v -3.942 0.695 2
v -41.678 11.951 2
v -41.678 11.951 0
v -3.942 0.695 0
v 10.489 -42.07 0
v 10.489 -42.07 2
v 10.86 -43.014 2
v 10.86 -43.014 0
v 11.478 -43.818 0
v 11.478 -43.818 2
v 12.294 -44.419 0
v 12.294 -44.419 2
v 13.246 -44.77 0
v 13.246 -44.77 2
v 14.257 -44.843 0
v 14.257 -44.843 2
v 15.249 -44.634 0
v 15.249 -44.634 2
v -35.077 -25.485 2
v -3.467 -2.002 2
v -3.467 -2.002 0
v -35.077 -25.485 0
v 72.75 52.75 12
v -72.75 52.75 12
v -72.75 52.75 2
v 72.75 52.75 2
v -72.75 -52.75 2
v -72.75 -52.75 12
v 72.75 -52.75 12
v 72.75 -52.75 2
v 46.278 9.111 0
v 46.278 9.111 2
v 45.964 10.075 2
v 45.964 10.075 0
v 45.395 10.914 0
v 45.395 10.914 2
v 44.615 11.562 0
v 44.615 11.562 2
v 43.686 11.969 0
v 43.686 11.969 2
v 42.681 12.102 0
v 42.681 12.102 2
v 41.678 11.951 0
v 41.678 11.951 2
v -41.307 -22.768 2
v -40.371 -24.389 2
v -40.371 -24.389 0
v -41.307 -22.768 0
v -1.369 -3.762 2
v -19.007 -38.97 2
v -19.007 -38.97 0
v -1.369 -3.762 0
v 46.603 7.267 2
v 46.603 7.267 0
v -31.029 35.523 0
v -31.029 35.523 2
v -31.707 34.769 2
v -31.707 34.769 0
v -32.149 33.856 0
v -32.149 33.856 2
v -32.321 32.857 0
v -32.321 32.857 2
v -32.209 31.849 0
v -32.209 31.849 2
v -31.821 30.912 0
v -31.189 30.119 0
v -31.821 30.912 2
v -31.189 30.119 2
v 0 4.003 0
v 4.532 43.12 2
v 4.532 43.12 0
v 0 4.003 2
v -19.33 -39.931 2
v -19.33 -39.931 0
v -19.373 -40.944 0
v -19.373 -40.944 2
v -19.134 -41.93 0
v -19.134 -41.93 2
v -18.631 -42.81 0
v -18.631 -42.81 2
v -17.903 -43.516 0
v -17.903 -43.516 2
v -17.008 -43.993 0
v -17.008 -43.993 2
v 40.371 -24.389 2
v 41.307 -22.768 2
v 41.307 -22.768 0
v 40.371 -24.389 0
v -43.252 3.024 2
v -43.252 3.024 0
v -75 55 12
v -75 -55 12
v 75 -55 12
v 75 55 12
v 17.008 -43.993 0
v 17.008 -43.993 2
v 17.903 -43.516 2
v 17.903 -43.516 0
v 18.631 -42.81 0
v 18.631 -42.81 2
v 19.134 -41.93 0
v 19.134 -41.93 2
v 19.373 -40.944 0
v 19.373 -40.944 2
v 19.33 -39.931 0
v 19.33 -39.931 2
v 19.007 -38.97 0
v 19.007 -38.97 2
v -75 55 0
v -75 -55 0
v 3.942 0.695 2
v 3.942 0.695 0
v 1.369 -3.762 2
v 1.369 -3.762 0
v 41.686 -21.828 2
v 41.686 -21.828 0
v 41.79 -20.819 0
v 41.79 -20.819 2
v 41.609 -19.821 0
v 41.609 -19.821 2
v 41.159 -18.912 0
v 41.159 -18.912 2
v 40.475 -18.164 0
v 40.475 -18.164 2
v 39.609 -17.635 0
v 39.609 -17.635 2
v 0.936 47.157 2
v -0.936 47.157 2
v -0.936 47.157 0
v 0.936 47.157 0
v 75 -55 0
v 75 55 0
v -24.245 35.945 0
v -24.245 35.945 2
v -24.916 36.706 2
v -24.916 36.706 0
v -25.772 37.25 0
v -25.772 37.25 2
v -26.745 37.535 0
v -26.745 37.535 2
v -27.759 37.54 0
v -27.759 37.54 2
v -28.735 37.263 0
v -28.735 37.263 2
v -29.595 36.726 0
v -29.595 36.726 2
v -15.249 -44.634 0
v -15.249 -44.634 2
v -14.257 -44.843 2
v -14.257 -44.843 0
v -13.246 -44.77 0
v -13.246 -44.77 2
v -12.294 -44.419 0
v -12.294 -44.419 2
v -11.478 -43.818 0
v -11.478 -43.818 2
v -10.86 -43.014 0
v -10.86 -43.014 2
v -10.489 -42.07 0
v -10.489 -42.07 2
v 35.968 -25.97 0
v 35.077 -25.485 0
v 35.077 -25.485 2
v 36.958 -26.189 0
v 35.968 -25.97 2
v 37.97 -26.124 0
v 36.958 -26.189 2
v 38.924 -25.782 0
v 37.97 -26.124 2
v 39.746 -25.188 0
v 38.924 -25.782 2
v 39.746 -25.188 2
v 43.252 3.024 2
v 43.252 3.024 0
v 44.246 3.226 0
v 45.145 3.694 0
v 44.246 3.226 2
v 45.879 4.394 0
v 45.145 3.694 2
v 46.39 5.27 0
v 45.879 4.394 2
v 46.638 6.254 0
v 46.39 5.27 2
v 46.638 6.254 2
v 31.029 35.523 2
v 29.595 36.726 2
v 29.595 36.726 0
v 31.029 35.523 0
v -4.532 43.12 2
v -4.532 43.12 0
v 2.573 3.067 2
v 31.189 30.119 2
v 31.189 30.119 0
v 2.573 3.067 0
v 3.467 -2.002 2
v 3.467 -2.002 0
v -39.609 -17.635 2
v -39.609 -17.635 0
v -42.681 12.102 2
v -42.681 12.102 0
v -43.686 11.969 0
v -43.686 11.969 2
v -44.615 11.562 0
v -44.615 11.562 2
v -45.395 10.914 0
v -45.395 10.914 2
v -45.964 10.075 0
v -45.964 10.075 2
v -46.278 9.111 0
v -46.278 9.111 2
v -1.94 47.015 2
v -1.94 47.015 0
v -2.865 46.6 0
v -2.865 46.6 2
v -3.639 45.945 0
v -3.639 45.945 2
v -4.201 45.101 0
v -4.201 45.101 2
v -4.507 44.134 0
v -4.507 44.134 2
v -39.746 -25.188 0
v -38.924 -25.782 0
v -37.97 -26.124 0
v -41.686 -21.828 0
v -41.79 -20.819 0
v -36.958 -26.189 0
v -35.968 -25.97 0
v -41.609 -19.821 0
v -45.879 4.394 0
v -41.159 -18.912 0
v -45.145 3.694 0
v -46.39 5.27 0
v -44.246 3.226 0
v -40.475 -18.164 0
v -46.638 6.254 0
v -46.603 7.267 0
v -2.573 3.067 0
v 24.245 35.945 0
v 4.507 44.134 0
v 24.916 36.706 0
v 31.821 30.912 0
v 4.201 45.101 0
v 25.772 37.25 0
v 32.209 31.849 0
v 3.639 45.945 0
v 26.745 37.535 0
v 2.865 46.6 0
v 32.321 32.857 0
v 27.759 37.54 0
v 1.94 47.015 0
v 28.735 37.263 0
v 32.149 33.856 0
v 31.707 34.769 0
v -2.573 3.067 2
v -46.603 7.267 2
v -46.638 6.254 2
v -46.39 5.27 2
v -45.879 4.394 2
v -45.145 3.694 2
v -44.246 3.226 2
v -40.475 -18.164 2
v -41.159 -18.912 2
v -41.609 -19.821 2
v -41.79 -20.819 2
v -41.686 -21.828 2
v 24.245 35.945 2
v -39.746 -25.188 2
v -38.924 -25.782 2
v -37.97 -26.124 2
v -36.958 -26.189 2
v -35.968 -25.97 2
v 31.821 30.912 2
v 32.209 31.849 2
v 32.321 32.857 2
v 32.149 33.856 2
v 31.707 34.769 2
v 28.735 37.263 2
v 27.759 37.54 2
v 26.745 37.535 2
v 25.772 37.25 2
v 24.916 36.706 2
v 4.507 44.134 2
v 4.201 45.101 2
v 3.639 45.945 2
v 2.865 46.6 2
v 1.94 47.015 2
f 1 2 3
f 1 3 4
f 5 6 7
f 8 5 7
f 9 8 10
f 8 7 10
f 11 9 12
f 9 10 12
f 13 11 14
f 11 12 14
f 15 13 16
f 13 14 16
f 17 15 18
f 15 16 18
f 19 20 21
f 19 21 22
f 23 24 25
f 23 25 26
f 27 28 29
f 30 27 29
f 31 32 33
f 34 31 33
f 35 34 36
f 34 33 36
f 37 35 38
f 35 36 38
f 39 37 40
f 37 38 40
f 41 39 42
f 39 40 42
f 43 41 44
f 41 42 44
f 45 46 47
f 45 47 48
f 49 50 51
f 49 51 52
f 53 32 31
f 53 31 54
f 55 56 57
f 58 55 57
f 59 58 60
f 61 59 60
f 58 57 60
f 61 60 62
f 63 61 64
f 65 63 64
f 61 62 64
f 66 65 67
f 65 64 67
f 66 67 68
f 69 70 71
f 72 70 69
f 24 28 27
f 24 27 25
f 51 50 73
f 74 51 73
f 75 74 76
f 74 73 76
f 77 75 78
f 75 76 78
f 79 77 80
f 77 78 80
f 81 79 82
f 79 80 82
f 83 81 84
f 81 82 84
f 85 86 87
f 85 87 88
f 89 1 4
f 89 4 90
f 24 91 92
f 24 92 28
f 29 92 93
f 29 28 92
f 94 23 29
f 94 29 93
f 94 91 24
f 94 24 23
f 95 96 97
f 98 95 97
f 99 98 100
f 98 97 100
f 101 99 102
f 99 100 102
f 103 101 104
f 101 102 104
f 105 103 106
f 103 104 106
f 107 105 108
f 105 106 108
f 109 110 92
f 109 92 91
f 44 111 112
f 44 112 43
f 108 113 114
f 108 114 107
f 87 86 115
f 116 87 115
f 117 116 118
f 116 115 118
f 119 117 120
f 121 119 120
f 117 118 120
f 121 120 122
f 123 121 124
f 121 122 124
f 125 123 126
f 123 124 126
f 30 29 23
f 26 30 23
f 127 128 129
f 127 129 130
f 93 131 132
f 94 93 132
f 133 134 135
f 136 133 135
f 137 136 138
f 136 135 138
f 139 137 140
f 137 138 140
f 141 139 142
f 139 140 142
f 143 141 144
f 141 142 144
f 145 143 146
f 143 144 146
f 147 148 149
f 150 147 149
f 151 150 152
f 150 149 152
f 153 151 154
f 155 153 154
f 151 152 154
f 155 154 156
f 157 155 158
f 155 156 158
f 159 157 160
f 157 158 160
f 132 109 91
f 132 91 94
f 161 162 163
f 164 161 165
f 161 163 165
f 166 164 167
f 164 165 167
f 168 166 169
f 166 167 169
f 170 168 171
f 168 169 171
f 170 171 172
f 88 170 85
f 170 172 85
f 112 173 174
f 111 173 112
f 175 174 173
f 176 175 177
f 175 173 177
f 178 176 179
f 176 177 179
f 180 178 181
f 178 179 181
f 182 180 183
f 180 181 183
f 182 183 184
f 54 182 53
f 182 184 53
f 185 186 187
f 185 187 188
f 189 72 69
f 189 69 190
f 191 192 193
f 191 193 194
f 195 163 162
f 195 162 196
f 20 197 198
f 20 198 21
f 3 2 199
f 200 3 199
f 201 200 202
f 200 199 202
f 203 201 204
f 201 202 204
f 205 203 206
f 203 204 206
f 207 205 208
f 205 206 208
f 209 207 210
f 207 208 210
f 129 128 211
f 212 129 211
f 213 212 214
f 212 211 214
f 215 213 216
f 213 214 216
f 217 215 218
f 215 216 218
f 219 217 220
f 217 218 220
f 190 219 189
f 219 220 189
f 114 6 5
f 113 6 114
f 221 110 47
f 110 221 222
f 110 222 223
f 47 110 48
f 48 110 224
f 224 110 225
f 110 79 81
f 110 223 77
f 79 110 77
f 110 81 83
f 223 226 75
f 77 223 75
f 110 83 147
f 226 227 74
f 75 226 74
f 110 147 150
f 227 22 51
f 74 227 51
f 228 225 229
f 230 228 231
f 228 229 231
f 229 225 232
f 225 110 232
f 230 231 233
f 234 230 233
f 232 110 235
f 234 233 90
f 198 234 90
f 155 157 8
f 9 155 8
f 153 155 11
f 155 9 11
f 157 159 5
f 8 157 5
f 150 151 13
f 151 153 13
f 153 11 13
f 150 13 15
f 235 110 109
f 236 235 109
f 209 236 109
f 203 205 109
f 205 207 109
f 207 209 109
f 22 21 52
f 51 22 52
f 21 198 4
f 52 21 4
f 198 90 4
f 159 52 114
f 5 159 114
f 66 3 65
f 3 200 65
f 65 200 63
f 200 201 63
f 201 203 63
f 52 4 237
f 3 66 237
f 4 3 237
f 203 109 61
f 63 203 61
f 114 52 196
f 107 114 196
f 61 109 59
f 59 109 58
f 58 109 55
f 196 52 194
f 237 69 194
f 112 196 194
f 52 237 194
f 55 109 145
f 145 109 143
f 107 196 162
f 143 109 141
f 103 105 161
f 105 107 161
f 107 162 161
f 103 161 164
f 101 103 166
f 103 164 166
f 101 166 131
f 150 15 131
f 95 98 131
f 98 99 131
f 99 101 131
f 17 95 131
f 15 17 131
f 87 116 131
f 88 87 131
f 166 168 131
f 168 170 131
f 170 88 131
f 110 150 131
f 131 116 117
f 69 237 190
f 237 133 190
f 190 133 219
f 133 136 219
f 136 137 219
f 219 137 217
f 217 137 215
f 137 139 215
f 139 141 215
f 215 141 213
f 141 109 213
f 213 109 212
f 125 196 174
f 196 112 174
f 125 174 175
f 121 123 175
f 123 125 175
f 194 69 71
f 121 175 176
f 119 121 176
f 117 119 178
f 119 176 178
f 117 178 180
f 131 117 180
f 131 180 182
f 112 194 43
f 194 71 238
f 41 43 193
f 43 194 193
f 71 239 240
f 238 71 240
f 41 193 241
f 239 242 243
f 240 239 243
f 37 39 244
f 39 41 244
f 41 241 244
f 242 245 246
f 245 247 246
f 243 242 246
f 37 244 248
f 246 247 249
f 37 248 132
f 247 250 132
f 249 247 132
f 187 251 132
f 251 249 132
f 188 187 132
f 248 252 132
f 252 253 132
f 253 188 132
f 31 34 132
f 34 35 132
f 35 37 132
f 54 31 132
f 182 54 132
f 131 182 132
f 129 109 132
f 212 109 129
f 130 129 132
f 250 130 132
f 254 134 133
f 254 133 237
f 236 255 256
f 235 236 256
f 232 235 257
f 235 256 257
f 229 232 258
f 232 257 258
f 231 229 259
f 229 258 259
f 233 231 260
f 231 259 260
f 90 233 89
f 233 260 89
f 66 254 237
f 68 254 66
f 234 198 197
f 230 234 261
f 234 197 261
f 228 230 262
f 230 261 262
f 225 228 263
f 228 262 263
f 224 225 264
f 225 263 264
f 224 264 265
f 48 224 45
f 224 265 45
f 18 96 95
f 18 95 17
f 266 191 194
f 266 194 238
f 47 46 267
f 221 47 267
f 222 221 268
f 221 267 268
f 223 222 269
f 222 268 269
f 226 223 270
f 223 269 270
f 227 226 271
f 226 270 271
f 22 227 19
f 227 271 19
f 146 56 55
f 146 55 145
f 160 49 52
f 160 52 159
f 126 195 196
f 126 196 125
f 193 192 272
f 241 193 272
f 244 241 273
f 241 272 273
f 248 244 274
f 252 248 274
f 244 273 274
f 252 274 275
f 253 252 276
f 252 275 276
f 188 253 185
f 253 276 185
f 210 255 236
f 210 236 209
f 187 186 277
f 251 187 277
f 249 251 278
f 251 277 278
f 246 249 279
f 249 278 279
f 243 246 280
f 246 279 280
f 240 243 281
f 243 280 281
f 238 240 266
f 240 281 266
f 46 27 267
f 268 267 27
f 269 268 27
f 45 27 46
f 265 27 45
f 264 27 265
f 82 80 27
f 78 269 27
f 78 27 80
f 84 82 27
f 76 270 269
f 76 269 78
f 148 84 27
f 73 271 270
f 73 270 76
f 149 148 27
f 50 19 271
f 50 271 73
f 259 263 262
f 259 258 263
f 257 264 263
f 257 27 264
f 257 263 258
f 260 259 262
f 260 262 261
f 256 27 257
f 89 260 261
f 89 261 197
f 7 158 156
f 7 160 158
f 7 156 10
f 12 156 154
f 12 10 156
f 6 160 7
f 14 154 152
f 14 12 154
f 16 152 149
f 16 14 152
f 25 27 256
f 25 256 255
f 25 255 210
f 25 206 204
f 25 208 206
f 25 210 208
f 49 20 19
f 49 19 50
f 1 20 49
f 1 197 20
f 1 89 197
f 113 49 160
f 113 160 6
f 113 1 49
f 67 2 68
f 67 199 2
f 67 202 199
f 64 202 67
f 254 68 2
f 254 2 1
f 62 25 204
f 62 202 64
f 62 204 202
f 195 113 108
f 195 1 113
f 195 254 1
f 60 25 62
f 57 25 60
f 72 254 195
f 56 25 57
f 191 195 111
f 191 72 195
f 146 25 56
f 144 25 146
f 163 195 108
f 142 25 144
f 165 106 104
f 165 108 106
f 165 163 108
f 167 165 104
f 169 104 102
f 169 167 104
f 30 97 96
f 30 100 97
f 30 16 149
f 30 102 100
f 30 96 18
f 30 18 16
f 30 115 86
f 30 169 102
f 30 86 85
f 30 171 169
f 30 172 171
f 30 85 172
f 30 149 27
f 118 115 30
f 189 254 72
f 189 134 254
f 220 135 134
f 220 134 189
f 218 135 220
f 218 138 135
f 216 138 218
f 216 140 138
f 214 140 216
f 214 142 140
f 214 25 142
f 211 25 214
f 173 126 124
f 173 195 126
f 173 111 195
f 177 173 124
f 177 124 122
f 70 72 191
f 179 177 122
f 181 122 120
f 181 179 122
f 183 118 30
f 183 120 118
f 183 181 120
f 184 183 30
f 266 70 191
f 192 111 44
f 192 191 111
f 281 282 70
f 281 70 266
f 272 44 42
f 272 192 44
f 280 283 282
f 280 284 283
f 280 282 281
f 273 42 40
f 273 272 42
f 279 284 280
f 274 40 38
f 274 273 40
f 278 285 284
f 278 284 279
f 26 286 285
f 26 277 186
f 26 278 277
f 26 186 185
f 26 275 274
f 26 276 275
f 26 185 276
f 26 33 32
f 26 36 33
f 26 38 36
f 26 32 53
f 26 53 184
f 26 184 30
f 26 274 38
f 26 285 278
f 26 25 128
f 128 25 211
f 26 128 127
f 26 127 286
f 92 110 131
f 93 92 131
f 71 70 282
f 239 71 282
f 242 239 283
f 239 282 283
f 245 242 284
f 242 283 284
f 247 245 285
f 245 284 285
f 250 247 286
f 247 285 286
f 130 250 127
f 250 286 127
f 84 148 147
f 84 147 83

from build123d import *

# Parameters (mm, degrees)
SKETCH007_W        = 150
SKETCH007_H        = 110
PAD002_DEPTH       = 12
SKETCH008_W        = 145.5
SKETCH008_H        = 105.5
POCKET004_DEPTH    = 10
POCKET005_DEPTH    = 5
POLARPATTERN_COUNT = 9


with BuildPart() as part:
    # Sketch007 → Pad002 (new body)
    with BuildSketch(Plane.XY):
        Rectangle(SKETCH007_W, SKETCH007_H)
    extrude(amount=PAD002_DEPTH)

    # Sketch008 (on Face6 of Pad002) → Pocket004 (cut)
    with BuildSketch(Plane.XY.offset(12)):
        Rectangle(SKETCH008_W, SKETCH008_H)
    extrude(amount=-POCKET004_DEPTH, mode=Mode.SUBTRACT)

    # Sketch009 (on Face11 of Pocket004) → Pocket005 (cut)
    with BuildSketch(Plane.XY.offset(2)):
        with BuildLine():
            Line((-0.935974, 47.157331), (0.935974, 47.157331))
            ThreePointArc((4.532255, 43.120312), (3.639248, 45.945137), (0.935974, 47.157331))
            Line((4.532255, 43.120312), (0, 4.003277))
            Line((0, 4.003277), (-4.532255, 43.120312))
            ThreePointArc((-0.935974, 47.157331), (-3.639248, 45.945137), (-4.532255, 43.120312))
        make_face()
    pocket005 = extrude(amount=-POCKET005_DEPTH, mode=Mode.SUBTRACT)

    # PolarPattern: Pocket005 ×9 about axis
    polarpattern_axis = Axis((0, 0, 2), (0, 0, 1))
    for i in range(1, POLARPATTERN_COUNT):
        add(pocket005.rotate(polarpattern_axis, i * 360 / POLARPATTERN_COUNT), mode=Mode.SUBTRACT)


solid = part.part
